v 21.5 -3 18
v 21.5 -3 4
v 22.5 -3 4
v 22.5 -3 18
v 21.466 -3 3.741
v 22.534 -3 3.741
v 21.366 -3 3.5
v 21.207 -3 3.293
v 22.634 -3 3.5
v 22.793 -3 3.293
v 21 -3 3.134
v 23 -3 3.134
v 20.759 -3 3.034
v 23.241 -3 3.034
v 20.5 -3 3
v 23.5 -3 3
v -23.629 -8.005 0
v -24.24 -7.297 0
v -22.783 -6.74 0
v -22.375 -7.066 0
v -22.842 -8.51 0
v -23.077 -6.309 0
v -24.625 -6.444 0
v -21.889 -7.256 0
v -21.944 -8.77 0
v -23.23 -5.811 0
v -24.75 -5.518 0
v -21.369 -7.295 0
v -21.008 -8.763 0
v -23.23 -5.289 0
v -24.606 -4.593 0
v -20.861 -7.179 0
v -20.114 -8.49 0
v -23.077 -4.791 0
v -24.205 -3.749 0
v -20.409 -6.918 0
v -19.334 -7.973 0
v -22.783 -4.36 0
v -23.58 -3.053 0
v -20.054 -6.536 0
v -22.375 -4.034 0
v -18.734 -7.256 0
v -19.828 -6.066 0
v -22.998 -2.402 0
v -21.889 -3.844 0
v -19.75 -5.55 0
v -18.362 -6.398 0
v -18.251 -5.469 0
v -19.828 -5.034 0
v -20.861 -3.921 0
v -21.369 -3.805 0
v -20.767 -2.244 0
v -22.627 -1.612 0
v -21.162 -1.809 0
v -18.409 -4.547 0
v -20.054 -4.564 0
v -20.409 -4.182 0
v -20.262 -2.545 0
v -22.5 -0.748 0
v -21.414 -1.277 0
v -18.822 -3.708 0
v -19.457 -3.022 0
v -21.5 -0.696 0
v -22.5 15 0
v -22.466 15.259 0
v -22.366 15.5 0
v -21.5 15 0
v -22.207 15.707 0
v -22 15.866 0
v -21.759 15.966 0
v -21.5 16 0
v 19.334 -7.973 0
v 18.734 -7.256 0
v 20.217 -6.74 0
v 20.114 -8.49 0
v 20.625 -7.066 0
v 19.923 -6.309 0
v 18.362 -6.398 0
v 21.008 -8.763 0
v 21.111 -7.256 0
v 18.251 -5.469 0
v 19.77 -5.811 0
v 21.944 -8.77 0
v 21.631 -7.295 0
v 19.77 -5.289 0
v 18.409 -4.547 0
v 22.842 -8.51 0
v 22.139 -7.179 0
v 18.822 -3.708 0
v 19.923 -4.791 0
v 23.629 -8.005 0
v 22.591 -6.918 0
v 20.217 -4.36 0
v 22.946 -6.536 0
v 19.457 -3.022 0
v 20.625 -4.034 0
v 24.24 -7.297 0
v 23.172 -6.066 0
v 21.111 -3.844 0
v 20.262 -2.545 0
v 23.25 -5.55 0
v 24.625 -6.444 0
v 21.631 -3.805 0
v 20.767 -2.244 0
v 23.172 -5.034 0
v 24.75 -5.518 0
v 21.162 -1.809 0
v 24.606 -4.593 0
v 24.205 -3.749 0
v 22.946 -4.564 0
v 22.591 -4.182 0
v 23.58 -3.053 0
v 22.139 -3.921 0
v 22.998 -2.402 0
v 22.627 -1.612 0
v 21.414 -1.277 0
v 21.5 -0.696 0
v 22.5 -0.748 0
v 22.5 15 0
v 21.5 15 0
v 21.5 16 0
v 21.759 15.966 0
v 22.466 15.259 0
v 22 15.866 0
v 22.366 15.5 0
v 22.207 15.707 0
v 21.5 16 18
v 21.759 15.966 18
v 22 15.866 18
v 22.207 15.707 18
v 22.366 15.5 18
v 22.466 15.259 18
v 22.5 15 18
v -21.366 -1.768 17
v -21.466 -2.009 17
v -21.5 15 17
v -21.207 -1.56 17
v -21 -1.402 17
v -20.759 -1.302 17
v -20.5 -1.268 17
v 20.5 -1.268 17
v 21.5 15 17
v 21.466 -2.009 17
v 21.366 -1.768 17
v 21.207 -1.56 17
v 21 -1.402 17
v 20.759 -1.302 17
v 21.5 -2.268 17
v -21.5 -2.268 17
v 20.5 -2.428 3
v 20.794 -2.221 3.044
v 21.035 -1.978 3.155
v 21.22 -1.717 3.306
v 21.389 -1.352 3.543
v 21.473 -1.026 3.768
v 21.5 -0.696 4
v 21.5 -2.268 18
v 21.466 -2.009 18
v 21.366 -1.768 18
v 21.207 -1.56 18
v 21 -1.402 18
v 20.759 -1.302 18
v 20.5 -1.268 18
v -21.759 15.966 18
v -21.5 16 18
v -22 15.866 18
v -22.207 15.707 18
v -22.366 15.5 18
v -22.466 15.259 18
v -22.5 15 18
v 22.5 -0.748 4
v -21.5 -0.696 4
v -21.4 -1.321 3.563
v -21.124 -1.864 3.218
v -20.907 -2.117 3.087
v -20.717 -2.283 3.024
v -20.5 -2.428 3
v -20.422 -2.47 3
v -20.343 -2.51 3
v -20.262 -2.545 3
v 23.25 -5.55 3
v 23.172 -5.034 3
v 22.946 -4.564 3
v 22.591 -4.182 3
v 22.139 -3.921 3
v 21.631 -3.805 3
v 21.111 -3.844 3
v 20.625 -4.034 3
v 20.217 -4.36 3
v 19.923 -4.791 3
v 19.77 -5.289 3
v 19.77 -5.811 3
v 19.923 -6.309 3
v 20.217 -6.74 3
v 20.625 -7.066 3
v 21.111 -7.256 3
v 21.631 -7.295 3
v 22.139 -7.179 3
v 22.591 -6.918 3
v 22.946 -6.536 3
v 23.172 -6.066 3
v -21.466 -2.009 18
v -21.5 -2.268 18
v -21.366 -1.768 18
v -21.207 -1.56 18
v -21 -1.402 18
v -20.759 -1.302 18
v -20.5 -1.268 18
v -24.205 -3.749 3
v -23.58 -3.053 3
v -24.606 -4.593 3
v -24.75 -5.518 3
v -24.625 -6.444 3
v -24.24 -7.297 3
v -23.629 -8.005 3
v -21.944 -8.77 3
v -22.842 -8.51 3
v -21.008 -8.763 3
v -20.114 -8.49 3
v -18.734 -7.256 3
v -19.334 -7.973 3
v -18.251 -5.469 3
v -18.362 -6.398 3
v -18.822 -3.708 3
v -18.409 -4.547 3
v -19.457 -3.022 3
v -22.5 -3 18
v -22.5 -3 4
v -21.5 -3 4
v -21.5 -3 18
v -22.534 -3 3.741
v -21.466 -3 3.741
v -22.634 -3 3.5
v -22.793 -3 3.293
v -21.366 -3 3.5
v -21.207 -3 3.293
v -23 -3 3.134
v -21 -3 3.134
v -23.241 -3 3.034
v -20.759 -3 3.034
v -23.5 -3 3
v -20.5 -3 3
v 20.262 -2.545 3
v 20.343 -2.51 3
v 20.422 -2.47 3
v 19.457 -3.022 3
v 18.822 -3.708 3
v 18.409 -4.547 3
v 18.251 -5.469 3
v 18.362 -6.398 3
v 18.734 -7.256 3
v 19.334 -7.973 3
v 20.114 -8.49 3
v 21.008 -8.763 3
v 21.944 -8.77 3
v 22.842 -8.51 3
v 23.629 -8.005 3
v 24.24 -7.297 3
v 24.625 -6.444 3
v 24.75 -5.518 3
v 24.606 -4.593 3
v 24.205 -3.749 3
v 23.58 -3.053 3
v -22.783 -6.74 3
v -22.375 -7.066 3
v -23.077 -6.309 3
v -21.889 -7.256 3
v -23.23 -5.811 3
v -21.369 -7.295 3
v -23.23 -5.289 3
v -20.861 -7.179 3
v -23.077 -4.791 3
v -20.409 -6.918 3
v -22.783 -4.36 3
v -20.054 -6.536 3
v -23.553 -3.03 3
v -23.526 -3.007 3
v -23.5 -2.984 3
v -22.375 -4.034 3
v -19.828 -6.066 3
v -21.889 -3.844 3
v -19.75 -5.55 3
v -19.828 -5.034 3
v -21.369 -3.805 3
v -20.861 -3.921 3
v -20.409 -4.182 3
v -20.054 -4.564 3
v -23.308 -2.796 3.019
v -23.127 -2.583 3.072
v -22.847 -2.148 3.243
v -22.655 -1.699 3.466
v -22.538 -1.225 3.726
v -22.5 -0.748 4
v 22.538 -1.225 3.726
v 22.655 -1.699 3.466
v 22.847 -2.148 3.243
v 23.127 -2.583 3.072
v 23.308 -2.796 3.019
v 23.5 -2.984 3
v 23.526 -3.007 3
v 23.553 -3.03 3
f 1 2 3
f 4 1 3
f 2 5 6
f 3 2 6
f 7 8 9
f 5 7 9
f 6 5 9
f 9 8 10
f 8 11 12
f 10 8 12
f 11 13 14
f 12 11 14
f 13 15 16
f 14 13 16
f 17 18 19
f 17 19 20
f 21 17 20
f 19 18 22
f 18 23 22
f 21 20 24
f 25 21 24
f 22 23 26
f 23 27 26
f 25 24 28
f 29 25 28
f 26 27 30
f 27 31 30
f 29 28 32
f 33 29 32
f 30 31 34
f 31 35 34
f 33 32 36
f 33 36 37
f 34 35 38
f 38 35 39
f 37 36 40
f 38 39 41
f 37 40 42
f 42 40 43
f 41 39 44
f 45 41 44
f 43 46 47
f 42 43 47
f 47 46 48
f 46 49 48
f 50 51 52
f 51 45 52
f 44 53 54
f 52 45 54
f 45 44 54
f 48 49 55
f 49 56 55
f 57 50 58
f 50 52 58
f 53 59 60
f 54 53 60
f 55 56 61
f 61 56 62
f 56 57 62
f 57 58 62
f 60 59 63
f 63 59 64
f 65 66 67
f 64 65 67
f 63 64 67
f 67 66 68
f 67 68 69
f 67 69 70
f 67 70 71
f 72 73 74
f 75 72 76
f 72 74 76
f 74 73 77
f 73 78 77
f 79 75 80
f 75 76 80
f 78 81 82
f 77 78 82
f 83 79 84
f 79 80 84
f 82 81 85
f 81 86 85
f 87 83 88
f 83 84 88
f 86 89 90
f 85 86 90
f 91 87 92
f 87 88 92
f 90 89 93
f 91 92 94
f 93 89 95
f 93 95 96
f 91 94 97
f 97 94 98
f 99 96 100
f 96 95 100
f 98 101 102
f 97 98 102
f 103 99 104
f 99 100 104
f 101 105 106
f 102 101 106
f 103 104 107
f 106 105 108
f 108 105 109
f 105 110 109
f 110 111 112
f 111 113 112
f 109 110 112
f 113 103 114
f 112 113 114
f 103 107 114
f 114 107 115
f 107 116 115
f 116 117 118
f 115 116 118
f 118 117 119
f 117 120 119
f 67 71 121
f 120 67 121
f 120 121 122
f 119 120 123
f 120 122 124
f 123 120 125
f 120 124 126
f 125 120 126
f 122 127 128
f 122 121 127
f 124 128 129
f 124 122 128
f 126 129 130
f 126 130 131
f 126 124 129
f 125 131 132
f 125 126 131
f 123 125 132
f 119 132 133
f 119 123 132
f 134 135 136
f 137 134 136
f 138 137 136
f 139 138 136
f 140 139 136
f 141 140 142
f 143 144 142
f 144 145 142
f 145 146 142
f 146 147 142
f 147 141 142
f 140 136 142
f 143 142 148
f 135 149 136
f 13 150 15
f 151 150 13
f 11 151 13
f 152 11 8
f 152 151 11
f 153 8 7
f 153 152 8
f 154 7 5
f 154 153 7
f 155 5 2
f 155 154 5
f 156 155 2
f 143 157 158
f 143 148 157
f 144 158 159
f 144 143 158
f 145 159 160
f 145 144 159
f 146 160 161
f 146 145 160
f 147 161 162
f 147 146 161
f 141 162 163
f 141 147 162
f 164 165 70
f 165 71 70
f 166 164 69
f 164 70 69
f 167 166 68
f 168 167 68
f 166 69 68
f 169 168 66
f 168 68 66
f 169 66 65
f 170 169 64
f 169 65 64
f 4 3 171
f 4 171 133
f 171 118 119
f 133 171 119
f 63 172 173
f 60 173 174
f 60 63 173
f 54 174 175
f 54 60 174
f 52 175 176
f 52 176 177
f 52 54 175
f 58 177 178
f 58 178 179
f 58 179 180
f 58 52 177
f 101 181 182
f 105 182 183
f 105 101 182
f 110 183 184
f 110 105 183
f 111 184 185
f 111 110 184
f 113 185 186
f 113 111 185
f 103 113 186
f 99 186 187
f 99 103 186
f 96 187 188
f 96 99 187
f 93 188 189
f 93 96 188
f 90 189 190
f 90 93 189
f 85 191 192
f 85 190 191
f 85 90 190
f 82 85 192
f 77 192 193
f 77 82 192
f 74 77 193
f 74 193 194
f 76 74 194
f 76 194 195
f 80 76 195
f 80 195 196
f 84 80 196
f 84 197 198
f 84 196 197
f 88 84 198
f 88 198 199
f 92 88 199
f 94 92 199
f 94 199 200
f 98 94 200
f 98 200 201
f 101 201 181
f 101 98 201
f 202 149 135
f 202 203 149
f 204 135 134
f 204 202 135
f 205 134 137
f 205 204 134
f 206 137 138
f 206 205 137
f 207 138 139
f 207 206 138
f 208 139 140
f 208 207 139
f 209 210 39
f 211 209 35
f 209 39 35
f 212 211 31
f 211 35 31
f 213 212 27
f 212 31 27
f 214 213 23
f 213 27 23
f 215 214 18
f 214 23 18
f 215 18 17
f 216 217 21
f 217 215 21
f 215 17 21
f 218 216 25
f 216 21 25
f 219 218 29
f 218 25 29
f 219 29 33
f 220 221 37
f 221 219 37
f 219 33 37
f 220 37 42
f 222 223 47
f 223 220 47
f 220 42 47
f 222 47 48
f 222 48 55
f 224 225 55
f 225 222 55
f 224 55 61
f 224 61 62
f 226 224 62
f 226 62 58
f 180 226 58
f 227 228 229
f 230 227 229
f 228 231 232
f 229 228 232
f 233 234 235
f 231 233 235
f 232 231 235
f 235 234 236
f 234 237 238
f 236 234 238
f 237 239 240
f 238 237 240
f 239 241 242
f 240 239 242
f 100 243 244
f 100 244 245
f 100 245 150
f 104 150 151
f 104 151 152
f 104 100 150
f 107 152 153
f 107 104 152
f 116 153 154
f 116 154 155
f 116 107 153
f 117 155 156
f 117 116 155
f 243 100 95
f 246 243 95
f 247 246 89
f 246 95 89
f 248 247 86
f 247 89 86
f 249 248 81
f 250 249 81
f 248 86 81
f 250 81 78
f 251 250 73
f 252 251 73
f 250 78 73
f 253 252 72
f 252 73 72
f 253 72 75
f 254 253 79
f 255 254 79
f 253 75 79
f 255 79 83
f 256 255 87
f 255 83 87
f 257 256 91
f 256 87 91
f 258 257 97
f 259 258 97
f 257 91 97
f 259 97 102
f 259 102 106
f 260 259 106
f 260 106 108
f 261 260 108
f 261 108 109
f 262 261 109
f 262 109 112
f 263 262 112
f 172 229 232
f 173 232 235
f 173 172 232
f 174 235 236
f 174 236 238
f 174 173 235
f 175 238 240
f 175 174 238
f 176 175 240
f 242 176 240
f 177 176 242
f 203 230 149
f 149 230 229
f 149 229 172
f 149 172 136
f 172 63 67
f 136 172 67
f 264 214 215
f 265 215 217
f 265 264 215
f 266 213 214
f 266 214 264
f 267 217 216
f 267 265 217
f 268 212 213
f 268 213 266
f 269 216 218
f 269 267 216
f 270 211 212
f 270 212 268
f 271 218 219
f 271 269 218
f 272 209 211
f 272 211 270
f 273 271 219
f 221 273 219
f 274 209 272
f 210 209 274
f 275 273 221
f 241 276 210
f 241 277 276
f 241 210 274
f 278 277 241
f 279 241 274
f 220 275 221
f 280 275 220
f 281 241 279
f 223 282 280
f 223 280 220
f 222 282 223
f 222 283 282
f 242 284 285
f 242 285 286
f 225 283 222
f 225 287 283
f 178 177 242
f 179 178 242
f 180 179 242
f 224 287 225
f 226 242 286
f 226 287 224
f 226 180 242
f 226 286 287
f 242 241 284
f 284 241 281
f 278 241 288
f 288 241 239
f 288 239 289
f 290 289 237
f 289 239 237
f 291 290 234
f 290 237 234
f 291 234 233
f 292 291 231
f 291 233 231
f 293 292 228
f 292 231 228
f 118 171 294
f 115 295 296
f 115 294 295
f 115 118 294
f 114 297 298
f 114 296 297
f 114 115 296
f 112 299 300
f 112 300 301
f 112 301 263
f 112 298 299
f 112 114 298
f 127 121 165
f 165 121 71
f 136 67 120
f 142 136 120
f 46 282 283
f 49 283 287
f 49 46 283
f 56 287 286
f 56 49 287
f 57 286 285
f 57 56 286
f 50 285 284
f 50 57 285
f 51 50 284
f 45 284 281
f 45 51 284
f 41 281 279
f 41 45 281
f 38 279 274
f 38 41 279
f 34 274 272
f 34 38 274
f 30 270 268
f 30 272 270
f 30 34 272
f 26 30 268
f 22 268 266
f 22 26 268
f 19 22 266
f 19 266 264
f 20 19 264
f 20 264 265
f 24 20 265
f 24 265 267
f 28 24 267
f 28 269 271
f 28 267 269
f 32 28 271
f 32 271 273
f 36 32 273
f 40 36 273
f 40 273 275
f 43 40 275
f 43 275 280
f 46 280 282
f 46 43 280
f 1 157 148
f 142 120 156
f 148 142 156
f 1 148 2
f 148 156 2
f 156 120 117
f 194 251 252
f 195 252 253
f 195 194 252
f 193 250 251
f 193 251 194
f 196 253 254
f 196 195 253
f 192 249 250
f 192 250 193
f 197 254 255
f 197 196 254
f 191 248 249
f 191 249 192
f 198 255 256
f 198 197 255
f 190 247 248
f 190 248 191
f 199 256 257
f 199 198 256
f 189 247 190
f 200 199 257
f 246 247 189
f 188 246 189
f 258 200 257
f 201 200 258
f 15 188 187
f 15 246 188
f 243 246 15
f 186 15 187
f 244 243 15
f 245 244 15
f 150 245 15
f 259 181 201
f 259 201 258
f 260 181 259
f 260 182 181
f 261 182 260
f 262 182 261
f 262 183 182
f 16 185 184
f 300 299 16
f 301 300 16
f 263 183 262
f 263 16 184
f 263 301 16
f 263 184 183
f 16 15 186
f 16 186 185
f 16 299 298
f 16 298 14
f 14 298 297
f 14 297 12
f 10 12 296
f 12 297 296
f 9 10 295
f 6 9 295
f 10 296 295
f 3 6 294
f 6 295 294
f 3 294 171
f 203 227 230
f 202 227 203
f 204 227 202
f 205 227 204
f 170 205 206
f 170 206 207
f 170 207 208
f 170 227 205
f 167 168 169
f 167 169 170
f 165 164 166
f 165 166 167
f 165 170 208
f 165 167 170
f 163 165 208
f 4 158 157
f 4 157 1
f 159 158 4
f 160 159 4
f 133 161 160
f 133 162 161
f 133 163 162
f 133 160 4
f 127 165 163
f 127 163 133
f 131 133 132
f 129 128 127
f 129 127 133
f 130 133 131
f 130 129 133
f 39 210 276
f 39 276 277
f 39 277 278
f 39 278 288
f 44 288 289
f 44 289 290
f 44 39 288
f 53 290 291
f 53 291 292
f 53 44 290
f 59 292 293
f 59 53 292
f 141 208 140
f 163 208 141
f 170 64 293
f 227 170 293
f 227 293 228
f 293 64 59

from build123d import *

# Parameters (mm, degrees)
F1_DEPTH = 18
F2_R     = 3.25
F3_DEPTH = 3
F5_W     = 45
F5_H     = 17.2675769106
F6_DEPTH = 1
F7_R     = 1.75
F8_DEPTH = 25
F9_R     = 3
F10_R    = 1
F11_R    = 3
F12_R    = 1
F13_R    = 1
F14_R    = 1
F15_R    = 1
F16_R    = 1
F17_R    = 2
F18_R    = 1
F19_R    = 2
F20_R    = 1


with BuildPart() as f1:
    # F0 (on Top) → F1 (new body)
    with BuildSketch(Plane.XY):
        Polygon((22.5, 16), (-22.5, 16), (-22.5, -3), (-21.5, -3), (-21.5, 15), (21.5, 15), (21.5, -3), (22.5, -3), align=None)
    extrude(amount=F1_DEPTH)

    # F2 (on Top) → F3 (join)
    with BuildSketch(Plane.XY):
        with Locations((-21.5, -5.55)):
            Circle(F2_R)
        with Locations((21.5, -5.55)):
            Circle(F2_R)
    extrude(amount=F3_DEPTH)

    # F5 (on offset) → F6 (join)
    with BuildSketch(Plane.XY.offset(18)):
        with Locations((0, 7.3662115447)):
            Rectangle(F5_W, F5_H)
    extrude(amount=-F6_DEPTH)

    # F7 (on Top) → F8 (cut)
    with BuildSketch(Plane.XY):
        with Locations((21.5, -5.55)):
            Circle(F7_R)
        with Locations((-21.5, -5.55)):
            Circle(F7_R)
    extrude(amount=F8_DEPTH, mode=Mode.SUBTRACT)

    # F9
    f9_edges = [f1.edges().sort_by_distance(p)[0] for p in [
        (22.5, -2.457671, 1.5),
    ]]
    fillet(f9_edges, radius=F9_R)

    # F10
    f10_edges = [f1.edges().sort_by_distance(p)[0] for p in [
        (22.5, -2.728835, 3),
    ]]
    fillet(f10_edges, radius=F10_R)

    # F11
    f11_edges = [f1.edges().sort_by_distance(p)[0] for p in [
        (-22.5, -2.457671, 1.5),
    ]]
    fillet(f11_edges, radius=F11_R)

    # F12
    f12_edges = [f1.edges().sort_by_distance(p)[0] for p in [
        (-22.5, -2.728835, 3),
    ]]
    fillet(f12_edges, radius=F12_R)

    # F13
    f13_edges = [f1.edges().sort_by_distance(p)[0] for p in [
        (-22.5, 16, 9),
    ]]
    fillet(f13_edges, radius=F13_R)

    # F14
    f14_edges = [f1.edges().sort_by_distance(p)[0] for p in [
        (22.5, 16, 9),
    ]]
    fillet(f14_edges, radius=F14_R)

    # F15
    f15_edges = [f1.edges().sort_by_distance(p)[0] for p in [
        (-21.5, -1.267577, 17.5),
    ]]
    fillet(f15_edges, radius=F15_R)

    # F16
    f16_edges = [f1.edges().sort_by_distance(p)[0] for p in [
        (21.5, -1.267577, 17.5),
    ]]
    fillet(f16_edges, radius=F16_R)

    # F17
    f17_edges = [f1.edges().sort_by_distance(p)[0] for p in [
        (-21.5, -2.3, 1.5),
    ]]
    fillet(f17_edges, radius=F17_R)

    # F18
    f18_edges = [f1.edges().sort_by_distance(p)[0] for p in [
        (-21.5, -2.65, 3),
    ]]
    fillet(f18_edges, radius=F18_R)

    # F19
    f19_edges = [f1.edges().sort_by_distance(p)[0] for p in [
        (21.5, -2.3, 1.5),
    ]]
    fillet(f19_edges, radius=F19_R)

    # F20
    f20_edges = [f1.edges().sort_by_distance(p)[0] for p in [
        (21.5, -2.65, 3),
    ]]
    fillet(f20_edges, radius=F20_R)


solid = f1.part
